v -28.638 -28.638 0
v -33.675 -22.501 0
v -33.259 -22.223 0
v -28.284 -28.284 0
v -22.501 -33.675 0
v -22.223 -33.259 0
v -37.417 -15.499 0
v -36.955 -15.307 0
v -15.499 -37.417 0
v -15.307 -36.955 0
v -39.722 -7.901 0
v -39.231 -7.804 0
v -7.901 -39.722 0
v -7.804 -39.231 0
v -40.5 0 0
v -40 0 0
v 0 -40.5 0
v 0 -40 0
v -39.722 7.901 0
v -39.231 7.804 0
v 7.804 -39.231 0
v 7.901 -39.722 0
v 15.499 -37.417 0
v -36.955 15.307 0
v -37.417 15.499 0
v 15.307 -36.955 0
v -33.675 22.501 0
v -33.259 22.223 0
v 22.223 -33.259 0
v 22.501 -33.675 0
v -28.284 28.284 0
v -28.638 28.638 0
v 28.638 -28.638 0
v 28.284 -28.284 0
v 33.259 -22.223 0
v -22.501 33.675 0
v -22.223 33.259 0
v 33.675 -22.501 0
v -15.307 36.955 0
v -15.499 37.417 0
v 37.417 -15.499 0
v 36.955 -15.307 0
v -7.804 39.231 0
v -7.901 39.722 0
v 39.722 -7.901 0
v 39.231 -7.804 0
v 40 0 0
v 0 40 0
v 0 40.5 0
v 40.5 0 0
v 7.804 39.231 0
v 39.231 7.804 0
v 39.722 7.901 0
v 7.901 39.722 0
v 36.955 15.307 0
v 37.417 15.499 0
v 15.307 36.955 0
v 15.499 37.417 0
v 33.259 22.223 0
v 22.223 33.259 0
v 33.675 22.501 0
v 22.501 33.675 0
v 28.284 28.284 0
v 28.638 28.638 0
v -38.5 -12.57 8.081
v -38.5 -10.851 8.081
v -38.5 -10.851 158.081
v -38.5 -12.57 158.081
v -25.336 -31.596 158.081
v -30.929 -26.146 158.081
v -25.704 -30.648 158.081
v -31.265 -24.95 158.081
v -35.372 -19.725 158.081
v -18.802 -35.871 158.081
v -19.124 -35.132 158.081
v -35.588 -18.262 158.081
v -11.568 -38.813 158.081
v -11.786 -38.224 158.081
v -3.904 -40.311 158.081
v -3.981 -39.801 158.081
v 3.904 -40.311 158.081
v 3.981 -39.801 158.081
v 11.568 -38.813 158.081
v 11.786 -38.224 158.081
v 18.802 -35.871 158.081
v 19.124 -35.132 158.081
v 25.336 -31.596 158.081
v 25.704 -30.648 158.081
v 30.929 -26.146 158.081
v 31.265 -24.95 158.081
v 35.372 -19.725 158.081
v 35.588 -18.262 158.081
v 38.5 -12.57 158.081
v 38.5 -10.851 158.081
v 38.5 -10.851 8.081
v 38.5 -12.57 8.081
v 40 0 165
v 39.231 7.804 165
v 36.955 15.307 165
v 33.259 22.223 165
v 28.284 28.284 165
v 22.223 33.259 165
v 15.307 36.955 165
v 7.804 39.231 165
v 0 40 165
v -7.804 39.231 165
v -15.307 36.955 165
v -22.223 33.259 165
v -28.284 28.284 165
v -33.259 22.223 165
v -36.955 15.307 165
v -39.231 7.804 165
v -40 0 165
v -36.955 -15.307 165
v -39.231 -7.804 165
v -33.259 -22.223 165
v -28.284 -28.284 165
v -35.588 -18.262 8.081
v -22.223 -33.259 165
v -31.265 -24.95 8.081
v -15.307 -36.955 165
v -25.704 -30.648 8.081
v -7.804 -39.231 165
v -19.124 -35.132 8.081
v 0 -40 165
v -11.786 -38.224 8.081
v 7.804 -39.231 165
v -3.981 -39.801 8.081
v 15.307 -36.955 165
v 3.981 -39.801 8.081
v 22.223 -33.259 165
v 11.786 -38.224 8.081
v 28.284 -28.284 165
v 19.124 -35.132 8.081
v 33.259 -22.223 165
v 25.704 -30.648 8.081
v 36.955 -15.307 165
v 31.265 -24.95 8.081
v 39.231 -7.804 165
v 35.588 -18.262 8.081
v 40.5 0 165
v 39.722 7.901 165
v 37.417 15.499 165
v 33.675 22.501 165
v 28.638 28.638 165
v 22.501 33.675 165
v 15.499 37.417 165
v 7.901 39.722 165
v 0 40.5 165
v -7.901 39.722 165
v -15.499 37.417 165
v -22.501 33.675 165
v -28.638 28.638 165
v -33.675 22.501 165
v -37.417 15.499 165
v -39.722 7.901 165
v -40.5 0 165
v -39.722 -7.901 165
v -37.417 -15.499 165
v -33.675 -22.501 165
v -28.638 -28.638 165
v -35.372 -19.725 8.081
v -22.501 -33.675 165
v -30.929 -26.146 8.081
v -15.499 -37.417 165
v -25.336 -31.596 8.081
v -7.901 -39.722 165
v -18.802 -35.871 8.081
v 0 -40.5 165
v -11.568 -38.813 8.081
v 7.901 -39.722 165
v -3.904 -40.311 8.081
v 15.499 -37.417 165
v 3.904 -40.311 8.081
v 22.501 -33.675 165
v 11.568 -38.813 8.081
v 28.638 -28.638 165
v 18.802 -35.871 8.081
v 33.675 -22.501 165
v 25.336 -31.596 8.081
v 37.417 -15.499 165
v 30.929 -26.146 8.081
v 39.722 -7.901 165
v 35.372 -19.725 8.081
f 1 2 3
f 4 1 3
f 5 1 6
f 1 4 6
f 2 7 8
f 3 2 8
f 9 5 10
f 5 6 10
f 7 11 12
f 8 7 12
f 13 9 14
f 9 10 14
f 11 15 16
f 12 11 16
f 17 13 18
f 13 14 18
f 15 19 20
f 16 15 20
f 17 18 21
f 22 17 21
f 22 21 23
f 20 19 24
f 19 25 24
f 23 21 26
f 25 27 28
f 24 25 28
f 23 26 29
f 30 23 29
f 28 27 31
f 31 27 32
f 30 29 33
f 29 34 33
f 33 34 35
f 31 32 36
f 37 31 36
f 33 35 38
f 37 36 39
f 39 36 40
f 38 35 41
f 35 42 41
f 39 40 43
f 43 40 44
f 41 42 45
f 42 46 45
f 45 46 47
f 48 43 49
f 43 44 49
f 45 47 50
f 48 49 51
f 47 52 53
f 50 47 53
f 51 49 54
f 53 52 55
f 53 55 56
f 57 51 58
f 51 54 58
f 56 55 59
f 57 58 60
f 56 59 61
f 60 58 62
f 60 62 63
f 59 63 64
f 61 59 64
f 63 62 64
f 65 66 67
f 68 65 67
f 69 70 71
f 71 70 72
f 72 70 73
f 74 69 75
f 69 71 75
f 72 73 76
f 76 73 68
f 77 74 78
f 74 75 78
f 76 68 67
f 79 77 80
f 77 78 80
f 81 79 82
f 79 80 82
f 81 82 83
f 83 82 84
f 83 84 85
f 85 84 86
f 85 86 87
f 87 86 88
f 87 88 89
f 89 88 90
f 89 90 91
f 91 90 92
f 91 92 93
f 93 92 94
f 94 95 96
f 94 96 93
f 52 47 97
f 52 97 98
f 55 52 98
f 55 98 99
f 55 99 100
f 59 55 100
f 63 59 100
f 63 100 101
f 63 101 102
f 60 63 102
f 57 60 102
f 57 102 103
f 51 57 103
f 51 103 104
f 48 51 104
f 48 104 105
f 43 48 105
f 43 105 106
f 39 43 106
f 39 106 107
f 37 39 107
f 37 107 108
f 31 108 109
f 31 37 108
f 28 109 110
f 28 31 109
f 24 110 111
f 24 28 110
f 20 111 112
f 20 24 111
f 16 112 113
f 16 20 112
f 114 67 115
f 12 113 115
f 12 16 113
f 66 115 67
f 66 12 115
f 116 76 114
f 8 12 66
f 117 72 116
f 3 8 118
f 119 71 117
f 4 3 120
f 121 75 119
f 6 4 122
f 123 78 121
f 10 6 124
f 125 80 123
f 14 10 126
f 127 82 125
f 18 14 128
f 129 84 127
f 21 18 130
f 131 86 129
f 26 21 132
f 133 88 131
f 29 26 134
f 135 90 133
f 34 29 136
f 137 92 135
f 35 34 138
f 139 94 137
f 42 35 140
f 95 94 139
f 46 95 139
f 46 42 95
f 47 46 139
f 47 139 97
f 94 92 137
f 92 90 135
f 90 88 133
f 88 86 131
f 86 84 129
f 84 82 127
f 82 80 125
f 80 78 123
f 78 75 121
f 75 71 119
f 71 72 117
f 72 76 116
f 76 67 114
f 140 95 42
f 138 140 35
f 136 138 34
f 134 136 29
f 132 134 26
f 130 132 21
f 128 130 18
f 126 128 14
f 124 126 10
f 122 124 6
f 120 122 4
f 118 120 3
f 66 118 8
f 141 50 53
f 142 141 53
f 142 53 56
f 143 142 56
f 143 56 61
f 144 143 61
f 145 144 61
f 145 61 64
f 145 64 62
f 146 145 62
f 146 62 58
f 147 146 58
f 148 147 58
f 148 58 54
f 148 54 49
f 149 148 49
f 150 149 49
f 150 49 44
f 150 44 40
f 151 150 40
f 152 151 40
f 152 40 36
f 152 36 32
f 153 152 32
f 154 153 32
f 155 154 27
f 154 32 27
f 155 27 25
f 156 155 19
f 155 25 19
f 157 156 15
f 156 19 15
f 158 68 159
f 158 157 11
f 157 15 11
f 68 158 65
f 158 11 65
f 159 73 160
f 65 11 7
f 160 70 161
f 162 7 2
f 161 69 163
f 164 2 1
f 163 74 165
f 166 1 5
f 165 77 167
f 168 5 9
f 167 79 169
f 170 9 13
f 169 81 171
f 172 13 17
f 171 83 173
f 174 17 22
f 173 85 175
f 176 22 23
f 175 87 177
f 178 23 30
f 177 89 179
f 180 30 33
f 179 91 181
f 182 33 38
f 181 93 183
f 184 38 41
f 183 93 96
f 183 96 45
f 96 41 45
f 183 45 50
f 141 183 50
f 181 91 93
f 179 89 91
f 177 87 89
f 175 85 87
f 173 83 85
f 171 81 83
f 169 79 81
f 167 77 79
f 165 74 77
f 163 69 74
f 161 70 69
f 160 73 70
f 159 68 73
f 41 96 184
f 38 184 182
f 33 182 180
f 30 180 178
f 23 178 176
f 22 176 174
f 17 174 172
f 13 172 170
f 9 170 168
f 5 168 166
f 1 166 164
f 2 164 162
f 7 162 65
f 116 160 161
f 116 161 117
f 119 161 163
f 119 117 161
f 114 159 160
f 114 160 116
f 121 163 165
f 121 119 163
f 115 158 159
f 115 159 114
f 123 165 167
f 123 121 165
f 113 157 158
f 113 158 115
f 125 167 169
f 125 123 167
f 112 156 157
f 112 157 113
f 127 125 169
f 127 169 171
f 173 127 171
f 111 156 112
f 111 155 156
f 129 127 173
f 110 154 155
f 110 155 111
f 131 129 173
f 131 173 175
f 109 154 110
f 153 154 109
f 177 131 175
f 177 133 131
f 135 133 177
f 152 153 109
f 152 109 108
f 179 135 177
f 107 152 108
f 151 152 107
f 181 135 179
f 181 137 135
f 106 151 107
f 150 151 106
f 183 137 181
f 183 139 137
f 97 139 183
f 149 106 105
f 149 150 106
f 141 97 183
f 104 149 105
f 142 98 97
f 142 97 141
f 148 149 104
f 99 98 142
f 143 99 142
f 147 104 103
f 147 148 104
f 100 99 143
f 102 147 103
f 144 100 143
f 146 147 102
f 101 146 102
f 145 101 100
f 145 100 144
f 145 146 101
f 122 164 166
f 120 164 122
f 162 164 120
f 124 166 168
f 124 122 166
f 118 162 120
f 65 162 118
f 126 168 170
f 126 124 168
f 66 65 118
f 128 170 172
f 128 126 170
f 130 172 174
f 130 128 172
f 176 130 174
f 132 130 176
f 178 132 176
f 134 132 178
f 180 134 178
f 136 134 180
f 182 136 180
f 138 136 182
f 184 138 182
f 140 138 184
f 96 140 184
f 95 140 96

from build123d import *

# Parameters (mm, degrees)
F0_R     = 40.5
F1_DEPTH = 165
F2_W     = 77
F2_H     = 150
F3_DEPTH = 50.000001
F4_T     = -1.5
F5_R     = 40
F6_DEPTH = 165


with BuildPart() as f1:
    # F0 (on Top) → F1 (new body)
    with BuildSketch(Plane.XY):
        Circle(F0_R)
    extrude(amount=F1_DEPTH)

    # F2 (on Front) → F3 (cut)
    with BuildSketch(Plane.XZ):
        with Locations((0, 83.080945)):
            Rectangle(F2_W, F2_H)
    extrude(amount=F3_DEPTH, mode=Mode.SUBTRACT)

    # F4
    f4_openings = [f1.faces().sort_by_distance(p)[0] for p in [
        (0, 0, 165),
    ]]
    offset(amount=F4_T, openings=f4_openings)

    # F5 (on Top) → F6 (cut)
    with BuildSketch(Plane.XY):
        Circle(F5_R)
    extrude(amount=F6_DEPTH, mode=Mode.SUBTRACT)


solid = f1.part
